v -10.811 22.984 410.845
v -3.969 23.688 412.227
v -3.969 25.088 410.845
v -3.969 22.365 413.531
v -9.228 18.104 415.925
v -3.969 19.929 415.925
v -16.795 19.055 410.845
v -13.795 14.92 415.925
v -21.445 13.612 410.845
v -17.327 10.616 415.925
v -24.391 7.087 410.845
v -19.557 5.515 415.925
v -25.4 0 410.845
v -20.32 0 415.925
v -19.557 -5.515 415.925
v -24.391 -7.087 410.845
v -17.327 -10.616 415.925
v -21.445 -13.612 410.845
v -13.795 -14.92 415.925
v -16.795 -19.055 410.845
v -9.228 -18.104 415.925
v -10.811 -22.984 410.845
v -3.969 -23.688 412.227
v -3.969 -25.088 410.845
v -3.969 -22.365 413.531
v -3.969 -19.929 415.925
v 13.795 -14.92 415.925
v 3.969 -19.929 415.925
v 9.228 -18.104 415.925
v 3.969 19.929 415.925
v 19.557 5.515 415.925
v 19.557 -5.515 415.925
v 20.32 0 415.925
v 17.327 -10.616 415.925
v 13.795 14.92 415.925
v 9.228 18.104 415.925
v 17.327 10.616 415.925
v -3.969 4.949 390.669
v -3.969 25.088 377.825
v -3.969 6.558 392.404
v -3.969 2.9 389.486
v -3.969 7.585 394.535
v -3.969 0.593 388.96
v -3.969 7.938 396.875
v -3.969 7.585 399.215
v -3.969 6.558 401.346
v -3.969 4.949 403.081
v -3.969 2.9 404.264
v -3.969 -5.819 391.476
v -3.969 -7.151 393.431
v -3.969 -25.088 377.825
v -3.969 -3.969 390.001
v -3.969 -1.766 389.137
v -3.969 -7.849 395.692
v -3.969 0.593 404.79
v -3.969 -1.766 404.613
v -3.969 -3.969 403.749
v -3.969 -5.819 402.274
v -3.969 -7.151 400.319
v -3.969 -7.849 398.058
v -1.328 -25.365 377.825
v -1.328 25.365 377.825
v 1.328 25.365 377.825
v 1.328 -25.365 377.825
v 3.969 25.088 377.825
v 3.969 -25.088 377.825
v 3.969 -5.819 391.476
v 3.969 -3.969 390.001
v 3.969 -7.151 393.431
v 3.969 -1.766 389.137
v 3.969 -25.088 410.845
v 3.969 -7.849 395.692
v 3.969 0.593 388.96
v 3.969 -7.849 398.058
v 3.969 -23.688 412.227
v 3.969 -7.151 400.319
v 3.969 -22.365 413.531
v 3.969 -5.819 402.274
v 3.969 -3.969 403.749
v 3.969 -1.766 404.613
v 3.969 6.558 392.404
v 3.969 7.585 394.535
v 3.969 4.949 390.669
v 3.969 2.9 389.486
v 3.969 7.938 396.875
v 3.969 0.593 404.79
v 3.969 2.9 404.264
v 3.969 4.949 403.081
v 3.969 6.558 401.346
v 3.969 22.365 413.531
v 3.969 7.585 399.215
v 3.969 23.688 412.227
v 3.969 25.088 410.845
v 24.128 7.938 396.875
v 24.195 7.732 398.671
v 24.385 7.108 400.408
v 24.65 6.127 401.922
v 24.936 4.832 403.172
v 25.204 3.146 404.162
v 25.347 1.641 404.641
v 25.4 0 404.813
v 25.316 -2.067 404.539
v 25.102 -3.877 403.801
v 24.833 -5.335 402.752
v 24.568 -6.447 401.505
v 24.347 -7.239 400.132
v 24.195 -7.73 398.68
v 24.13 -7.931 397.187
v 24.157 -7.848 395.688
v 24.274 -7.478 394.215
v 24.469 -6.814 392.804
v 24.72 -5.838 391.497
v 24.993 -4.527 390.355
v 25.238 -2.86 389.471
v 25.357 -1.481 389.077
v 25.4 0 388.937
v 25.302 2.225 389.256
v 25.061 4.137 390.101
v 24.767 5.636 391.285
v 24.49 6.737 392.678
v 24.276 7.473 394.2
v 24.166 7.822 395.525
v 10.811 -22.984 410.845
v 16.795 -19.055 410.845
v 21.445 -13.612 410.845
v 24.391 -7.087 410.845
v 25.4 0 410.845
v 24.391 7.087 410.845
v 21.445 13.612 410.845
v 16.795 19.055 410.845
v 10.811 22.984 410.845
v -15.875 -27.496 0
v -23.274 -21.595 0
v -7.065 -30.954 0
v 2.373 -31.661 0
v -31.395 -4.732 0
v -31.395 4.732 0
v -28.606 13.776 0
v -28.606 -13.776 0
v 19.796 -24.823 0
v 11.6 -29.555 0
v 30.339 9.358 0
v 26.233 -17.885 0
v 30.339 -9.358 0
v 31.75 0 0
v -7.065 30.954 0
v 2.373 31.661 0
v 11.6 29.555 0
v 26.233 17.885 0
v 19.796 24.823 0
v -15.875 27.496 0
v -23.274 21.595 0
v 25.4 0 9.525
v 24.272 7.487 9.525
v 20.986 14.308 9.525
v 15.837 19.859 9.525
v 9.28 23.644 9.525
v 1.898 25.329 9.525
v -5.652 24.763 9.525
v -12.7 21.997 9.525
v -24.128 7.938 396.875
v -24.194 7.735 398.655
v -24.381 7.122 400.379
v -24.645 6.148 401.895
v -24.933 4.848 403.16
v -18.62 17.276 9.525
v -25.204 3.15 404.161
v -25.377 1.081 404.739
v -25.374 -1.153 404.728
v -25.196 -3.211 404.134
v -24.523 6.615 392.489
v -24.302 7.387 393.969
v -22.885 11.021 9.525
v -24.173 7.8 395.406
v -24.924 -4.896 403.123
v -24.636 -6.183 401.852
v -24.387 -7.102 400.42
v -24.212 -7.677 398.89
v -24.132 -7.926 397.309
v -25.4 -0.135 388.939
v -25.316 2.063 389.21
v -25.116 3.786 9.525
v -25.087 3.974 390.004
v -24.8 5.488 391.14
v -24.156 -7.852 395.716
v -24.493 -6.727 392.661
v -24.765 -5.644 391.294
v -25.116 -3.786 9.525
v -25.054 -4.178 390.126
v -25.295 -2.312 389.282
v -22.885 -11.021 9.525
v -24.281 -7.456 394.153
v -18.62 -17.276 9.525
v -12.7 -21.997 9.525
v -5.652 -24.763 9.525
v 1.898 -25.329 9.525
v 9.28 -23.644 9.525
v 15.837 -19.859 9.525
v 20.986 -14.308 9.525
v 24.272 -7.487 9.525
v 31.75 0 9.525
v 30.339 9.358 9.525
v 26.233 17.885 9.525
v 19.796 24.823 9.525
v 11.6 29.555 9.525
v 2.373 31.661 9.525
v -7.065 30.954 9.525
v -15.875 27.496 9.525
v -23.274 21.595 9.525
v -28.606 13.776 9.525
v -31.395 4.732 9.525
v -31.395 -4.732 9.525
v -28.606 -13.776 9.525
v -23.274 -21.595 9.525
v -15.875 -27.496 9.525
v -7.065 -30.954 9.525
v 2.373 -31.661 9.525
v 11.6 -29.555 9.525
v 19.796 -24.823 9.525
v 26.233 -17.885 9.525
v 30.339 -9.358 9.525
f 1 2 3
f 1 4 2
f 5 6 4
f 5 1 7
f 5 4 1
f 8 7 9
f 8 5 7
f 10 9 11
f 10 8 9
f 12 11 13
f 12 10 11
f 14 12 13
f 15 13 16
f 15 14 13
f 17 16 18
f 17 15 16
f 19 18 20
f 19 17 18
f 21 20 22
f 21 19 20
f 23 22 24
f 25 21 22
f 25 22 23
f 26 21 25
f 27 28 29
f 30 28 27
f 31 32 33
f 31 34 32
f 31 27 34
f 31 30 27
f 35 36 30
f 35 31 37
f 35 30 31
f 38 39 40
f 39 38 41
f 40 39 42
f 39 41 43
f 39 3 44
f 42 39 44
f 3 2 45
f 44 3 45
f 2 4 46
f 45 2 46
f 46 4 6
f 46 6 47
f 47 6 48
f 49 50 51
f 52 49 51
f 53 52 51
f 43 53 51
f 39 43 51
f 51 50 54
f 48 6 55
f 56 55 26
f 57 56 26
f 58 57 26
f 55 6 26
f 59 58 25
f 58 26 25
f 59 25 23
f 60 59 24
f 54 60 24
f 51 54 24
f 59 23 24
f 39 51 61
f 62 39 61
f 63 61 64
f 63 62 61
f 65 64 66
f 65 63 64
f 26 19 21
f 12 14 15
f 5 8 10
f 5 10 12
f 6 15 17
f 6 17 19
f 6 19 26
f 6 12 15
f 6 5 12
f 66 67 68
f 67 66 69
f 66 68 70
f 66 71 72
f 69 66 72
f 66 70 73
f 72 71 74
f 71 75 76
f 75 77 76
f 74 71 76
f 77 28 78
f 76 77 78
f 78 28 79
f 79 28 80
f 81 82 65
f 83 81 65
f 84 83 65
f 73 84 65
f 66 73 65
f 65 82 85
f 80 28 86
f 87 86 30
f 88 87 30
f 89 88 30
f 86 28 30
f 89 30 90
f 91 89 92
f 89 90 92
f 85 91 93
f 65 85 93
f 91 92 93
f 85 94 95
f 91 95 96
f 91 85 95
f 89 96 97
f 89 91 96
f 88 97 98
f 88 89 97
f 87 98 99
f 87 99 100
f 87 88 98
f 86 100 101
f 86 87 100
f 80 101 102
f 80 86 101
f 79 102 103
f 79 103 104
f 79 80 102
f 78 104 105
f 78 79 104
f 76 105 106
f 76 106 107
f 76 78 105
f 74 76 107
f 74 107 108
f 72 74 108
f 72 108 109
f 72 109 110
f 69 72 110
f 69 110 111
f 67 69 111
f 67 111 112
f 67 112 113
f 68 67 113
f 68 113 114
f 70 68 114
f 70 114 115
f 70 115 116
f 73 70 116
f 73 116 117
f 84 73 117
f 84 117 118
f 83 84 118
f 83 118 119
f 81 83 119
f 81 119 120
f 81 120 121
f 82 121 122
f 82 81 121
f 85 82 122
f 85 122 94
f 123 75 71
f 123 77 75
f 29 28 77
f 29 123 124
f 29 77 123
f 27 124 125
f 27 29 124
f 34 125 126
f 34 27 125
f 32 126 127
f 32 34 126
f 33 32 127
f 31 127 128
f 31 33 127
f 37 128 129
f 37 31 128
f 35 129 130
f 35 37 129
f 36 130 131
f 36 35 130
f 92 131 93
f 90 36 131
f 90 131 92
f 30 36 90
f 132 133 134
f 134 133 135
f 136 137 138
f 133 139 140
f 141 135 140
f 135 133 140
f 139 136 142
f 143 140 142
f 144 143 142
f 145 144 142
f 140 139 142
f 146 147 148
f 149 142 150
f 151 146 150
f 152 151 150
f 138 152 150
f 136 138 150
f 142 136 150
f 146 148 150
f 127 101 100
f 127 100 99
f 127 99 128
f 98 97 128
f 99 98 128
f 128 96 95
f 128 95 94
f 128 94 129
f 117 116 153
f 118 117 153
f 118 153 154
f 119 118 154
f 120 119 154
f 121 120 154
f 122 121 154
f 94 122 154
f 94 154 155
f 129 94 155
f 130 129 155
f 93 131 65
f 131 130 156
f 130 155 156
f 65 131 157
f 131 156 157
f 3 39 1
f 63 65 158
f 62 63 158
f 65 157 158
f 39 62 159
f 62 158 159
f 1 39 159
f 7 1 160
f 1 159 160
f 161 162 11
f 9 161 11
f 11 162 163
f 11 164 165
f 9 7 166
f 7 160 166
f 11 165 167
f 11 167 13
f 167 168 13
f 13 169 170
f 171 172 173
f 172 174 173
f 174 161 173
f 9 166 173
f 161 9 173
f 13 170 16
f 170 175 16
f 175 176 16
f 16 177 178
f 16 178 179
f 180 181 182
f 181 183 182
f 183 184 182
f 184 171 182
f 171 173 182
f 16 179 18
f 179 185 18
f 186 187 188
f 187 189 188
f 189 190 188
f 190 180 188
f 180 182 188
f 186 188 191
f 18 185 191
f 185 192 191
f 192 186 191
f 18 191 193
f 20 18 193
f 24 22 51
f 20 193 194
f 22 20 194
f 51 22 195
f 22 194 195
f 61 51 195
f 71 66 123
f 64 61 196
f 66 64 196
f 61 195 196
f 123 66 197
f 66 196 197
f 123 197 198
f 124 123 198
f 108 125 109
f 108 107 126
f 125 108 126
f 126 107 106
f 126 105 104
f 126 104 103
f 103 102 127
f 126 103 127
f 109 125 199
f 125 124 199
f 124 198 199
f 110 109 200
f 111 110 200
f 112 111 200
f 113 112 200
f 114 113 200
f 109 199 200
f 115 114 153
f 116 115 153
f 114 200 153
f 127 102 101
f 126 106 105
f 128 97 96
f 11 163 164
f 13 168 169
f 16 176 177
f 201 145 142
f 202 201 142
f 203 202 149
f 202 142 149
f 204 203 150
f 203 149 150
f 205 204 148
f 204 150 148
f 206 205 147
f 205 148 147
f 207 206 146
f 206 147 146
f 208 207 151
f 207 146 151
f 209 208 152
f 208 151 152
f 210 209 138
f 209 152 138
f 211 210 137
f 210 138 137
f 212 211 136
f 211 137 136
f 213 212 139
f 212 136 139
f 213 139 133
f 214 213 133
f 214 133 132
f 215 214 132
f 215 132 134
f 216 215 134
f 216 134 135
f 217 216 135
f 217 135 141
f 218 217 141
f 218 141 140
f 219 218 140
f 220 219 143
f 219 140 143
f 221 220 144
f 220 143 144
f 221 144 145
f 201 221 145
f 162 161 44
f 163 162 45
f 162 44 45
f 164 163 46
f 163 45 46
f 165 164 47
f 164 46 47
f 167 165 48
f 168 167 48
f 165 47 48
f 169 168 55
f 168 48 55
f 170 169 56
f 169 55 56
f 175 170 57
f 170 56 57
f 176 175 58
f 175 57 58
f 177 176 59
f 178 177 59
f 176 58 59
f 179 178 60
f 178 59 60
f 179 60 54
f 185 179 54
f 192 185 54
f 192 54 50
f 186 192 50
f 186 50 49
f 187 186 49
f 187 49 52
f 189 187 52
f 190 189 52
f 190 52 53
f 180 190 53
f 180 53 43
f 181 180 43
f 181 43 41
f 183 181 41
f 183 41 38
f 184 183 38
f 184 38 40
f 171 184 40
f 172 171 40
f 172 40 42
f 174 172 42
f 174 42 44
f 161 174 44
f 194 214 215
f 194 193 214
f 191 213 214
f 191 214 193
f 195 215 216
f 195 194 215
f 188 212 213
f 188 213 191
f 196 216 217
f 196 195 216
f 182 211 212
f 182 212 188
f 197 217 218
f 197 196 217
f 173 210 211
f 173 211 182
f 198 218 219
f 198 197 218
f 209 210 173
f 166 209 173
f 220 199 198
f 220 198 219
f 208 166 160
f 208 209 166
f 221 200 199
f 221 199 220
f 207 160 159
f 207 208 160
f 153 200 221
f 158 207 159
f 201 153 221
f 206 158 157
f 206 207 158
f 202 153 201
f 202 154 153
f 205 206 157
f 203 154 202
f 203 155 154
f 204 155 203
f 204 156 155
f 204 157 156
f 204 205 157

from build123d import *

# Parameters (mm, degrees)
F0_R          = 31.75
F1_DEPTH      = 9.525
F2_R          = 25.4
F3_DEPTH      = 406.4
F5_DEPTH      = 38.1
F6_R          = 7.9375
F7_DEPTH      = 25.4
F7_DEPTH_BACK = 50.8
F8_SIZE       = 5.08


with BuildPart() as f1:
    # F0 (on Top) → F1 (new body)
    with BuildSketch(Plane.XY):
        Circle(F0_R)
    extrude(amount=F1_DEPTH)

    # F2 (on face) → F3 (join)
    with BuildSketch(Plane.XY.offset(9.525)):
        Circle(F2_R)
    extrude(amount=F3_DEPTH)

    # F4 (on face) → F5 (cut)
    with BuildSketch(Plane.XY.offset(415.925)):
        with BuildLine():
            ThreePointArc((3.96875, 25.088025499), (0, 25.4), (-3.96875, 25.088025499))
            Line((-3.96875, 25.088025499), (-3.96875, -25.088025499))
            ThreePointArc((-3.96875, -25.088025499), (0, -25.4), (3.96875, -25.088025499))
            Line((3.96875, -25.088025499), (3.96875, 25.088025499))
        make_face()
    extrude(amount=-F5_DEPTH, mode=Mode.SUBTRACT)

    # F6 (on face) → F7 (cut, two sides)
    with BuildSketch(Plane.YZ.offset(-3.96875)) as f7_sk:
        with Locations((0, 396.875)):
            Circle(F6_R)
    extrude(amount=-F7_DEPTH, mode=Mode.SUBTRACT)
    extrude(f7_sk.sketch, amount=F7_DEPTH_BACK, mode=Mode.SUBTRACT)

    # F8
    f8_edges = [f1.edges().sort_by_distance(p)[0] for p in [
        (-25.4, 0, 415.925),
        (19.312771, -16.497784, 415.925),
        (19.312771, 16.497784, 415.925),
    ]]
    chamfer(f8_edges, length=F8_SIZE)


solid = f1.part
